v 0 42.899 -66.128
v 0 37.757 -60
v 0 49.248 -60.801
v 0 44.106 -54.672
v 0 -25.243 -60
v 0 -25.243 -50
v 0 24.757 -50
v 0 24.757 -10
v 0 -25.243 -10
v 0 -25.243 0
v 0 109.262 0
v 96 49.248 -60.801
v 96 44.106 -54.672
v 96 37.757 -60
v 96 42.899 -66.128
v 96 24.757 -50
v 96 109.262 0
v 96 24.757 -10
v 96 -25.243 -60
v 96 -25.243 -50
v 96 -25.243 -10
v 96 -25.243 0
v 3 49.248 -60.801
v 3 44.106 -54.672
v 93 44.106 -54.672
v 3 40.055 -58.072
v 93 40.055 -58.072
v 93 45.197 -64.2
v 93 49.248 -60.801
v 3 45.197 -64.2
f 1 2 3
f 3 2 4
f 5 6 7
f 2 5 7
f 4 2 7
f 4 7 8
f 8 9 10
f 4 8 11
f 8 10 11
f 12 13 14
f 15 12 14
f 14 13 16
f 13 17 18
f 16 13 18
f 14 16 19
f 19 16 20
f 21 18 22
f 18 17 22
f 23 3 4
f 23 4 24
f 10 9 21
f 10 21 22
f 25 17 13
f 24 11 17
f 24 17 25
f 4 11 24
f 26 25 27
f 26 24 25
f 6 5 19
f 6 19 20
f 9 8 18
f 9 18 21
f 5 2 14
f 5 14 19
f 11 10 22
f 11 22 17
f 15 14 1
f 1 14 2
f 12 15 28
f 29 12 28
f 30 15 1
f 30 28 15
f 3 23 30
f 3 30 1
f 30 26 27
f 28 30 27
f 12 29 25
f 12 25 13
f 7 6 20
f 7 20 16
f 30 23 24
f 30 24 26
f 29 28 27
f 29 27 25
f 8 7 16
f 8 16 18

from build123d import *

# Parameters (mm, degrees)
EXTRUDE_1_DEPTH = 96
EXTRUDE_2_DEPTH = 8


with BuildPart() as part:
    # Эскиз1 → Бобышка-Вытянуть1 (new body)
    with BuildSketch(Plane(origin=(0, 0, 0), x_dir=(0, 0, -1), z_dir=(1, 0, 0))):
        Polygon((0, 109.262066559), (60, 37.756851003), (60, -25.242859431), (50, -25.242859431), (50, 24.757140569), (10, 24.757140569), (10, -25.242859431), (0, -25.242859431), align=None)
    extrude(amount=EXTRUDE_1_DEPTH)

    # Эскиз3 → Бобышка-Вытянуть2 (add)
    with BuildSketch(Plane(origin=(0, 45.144453906, -53.801065128), x_dir=(-1, 0, 0), z_dir=(0, 0.6427876096865404, -0.7660444431189771))):
        Polygon((-96, -1.355361582), (-96, -9.643830681), (0, -9.643830681), (0, -1.355361582), (-3, -1.355361582), (-3, -6.643830681), (-93, -6.643830681), (-93, -1.355361582), align=None)
    extrude(amount=EXTRUDE_2_DEPTH)


solid = part.part
